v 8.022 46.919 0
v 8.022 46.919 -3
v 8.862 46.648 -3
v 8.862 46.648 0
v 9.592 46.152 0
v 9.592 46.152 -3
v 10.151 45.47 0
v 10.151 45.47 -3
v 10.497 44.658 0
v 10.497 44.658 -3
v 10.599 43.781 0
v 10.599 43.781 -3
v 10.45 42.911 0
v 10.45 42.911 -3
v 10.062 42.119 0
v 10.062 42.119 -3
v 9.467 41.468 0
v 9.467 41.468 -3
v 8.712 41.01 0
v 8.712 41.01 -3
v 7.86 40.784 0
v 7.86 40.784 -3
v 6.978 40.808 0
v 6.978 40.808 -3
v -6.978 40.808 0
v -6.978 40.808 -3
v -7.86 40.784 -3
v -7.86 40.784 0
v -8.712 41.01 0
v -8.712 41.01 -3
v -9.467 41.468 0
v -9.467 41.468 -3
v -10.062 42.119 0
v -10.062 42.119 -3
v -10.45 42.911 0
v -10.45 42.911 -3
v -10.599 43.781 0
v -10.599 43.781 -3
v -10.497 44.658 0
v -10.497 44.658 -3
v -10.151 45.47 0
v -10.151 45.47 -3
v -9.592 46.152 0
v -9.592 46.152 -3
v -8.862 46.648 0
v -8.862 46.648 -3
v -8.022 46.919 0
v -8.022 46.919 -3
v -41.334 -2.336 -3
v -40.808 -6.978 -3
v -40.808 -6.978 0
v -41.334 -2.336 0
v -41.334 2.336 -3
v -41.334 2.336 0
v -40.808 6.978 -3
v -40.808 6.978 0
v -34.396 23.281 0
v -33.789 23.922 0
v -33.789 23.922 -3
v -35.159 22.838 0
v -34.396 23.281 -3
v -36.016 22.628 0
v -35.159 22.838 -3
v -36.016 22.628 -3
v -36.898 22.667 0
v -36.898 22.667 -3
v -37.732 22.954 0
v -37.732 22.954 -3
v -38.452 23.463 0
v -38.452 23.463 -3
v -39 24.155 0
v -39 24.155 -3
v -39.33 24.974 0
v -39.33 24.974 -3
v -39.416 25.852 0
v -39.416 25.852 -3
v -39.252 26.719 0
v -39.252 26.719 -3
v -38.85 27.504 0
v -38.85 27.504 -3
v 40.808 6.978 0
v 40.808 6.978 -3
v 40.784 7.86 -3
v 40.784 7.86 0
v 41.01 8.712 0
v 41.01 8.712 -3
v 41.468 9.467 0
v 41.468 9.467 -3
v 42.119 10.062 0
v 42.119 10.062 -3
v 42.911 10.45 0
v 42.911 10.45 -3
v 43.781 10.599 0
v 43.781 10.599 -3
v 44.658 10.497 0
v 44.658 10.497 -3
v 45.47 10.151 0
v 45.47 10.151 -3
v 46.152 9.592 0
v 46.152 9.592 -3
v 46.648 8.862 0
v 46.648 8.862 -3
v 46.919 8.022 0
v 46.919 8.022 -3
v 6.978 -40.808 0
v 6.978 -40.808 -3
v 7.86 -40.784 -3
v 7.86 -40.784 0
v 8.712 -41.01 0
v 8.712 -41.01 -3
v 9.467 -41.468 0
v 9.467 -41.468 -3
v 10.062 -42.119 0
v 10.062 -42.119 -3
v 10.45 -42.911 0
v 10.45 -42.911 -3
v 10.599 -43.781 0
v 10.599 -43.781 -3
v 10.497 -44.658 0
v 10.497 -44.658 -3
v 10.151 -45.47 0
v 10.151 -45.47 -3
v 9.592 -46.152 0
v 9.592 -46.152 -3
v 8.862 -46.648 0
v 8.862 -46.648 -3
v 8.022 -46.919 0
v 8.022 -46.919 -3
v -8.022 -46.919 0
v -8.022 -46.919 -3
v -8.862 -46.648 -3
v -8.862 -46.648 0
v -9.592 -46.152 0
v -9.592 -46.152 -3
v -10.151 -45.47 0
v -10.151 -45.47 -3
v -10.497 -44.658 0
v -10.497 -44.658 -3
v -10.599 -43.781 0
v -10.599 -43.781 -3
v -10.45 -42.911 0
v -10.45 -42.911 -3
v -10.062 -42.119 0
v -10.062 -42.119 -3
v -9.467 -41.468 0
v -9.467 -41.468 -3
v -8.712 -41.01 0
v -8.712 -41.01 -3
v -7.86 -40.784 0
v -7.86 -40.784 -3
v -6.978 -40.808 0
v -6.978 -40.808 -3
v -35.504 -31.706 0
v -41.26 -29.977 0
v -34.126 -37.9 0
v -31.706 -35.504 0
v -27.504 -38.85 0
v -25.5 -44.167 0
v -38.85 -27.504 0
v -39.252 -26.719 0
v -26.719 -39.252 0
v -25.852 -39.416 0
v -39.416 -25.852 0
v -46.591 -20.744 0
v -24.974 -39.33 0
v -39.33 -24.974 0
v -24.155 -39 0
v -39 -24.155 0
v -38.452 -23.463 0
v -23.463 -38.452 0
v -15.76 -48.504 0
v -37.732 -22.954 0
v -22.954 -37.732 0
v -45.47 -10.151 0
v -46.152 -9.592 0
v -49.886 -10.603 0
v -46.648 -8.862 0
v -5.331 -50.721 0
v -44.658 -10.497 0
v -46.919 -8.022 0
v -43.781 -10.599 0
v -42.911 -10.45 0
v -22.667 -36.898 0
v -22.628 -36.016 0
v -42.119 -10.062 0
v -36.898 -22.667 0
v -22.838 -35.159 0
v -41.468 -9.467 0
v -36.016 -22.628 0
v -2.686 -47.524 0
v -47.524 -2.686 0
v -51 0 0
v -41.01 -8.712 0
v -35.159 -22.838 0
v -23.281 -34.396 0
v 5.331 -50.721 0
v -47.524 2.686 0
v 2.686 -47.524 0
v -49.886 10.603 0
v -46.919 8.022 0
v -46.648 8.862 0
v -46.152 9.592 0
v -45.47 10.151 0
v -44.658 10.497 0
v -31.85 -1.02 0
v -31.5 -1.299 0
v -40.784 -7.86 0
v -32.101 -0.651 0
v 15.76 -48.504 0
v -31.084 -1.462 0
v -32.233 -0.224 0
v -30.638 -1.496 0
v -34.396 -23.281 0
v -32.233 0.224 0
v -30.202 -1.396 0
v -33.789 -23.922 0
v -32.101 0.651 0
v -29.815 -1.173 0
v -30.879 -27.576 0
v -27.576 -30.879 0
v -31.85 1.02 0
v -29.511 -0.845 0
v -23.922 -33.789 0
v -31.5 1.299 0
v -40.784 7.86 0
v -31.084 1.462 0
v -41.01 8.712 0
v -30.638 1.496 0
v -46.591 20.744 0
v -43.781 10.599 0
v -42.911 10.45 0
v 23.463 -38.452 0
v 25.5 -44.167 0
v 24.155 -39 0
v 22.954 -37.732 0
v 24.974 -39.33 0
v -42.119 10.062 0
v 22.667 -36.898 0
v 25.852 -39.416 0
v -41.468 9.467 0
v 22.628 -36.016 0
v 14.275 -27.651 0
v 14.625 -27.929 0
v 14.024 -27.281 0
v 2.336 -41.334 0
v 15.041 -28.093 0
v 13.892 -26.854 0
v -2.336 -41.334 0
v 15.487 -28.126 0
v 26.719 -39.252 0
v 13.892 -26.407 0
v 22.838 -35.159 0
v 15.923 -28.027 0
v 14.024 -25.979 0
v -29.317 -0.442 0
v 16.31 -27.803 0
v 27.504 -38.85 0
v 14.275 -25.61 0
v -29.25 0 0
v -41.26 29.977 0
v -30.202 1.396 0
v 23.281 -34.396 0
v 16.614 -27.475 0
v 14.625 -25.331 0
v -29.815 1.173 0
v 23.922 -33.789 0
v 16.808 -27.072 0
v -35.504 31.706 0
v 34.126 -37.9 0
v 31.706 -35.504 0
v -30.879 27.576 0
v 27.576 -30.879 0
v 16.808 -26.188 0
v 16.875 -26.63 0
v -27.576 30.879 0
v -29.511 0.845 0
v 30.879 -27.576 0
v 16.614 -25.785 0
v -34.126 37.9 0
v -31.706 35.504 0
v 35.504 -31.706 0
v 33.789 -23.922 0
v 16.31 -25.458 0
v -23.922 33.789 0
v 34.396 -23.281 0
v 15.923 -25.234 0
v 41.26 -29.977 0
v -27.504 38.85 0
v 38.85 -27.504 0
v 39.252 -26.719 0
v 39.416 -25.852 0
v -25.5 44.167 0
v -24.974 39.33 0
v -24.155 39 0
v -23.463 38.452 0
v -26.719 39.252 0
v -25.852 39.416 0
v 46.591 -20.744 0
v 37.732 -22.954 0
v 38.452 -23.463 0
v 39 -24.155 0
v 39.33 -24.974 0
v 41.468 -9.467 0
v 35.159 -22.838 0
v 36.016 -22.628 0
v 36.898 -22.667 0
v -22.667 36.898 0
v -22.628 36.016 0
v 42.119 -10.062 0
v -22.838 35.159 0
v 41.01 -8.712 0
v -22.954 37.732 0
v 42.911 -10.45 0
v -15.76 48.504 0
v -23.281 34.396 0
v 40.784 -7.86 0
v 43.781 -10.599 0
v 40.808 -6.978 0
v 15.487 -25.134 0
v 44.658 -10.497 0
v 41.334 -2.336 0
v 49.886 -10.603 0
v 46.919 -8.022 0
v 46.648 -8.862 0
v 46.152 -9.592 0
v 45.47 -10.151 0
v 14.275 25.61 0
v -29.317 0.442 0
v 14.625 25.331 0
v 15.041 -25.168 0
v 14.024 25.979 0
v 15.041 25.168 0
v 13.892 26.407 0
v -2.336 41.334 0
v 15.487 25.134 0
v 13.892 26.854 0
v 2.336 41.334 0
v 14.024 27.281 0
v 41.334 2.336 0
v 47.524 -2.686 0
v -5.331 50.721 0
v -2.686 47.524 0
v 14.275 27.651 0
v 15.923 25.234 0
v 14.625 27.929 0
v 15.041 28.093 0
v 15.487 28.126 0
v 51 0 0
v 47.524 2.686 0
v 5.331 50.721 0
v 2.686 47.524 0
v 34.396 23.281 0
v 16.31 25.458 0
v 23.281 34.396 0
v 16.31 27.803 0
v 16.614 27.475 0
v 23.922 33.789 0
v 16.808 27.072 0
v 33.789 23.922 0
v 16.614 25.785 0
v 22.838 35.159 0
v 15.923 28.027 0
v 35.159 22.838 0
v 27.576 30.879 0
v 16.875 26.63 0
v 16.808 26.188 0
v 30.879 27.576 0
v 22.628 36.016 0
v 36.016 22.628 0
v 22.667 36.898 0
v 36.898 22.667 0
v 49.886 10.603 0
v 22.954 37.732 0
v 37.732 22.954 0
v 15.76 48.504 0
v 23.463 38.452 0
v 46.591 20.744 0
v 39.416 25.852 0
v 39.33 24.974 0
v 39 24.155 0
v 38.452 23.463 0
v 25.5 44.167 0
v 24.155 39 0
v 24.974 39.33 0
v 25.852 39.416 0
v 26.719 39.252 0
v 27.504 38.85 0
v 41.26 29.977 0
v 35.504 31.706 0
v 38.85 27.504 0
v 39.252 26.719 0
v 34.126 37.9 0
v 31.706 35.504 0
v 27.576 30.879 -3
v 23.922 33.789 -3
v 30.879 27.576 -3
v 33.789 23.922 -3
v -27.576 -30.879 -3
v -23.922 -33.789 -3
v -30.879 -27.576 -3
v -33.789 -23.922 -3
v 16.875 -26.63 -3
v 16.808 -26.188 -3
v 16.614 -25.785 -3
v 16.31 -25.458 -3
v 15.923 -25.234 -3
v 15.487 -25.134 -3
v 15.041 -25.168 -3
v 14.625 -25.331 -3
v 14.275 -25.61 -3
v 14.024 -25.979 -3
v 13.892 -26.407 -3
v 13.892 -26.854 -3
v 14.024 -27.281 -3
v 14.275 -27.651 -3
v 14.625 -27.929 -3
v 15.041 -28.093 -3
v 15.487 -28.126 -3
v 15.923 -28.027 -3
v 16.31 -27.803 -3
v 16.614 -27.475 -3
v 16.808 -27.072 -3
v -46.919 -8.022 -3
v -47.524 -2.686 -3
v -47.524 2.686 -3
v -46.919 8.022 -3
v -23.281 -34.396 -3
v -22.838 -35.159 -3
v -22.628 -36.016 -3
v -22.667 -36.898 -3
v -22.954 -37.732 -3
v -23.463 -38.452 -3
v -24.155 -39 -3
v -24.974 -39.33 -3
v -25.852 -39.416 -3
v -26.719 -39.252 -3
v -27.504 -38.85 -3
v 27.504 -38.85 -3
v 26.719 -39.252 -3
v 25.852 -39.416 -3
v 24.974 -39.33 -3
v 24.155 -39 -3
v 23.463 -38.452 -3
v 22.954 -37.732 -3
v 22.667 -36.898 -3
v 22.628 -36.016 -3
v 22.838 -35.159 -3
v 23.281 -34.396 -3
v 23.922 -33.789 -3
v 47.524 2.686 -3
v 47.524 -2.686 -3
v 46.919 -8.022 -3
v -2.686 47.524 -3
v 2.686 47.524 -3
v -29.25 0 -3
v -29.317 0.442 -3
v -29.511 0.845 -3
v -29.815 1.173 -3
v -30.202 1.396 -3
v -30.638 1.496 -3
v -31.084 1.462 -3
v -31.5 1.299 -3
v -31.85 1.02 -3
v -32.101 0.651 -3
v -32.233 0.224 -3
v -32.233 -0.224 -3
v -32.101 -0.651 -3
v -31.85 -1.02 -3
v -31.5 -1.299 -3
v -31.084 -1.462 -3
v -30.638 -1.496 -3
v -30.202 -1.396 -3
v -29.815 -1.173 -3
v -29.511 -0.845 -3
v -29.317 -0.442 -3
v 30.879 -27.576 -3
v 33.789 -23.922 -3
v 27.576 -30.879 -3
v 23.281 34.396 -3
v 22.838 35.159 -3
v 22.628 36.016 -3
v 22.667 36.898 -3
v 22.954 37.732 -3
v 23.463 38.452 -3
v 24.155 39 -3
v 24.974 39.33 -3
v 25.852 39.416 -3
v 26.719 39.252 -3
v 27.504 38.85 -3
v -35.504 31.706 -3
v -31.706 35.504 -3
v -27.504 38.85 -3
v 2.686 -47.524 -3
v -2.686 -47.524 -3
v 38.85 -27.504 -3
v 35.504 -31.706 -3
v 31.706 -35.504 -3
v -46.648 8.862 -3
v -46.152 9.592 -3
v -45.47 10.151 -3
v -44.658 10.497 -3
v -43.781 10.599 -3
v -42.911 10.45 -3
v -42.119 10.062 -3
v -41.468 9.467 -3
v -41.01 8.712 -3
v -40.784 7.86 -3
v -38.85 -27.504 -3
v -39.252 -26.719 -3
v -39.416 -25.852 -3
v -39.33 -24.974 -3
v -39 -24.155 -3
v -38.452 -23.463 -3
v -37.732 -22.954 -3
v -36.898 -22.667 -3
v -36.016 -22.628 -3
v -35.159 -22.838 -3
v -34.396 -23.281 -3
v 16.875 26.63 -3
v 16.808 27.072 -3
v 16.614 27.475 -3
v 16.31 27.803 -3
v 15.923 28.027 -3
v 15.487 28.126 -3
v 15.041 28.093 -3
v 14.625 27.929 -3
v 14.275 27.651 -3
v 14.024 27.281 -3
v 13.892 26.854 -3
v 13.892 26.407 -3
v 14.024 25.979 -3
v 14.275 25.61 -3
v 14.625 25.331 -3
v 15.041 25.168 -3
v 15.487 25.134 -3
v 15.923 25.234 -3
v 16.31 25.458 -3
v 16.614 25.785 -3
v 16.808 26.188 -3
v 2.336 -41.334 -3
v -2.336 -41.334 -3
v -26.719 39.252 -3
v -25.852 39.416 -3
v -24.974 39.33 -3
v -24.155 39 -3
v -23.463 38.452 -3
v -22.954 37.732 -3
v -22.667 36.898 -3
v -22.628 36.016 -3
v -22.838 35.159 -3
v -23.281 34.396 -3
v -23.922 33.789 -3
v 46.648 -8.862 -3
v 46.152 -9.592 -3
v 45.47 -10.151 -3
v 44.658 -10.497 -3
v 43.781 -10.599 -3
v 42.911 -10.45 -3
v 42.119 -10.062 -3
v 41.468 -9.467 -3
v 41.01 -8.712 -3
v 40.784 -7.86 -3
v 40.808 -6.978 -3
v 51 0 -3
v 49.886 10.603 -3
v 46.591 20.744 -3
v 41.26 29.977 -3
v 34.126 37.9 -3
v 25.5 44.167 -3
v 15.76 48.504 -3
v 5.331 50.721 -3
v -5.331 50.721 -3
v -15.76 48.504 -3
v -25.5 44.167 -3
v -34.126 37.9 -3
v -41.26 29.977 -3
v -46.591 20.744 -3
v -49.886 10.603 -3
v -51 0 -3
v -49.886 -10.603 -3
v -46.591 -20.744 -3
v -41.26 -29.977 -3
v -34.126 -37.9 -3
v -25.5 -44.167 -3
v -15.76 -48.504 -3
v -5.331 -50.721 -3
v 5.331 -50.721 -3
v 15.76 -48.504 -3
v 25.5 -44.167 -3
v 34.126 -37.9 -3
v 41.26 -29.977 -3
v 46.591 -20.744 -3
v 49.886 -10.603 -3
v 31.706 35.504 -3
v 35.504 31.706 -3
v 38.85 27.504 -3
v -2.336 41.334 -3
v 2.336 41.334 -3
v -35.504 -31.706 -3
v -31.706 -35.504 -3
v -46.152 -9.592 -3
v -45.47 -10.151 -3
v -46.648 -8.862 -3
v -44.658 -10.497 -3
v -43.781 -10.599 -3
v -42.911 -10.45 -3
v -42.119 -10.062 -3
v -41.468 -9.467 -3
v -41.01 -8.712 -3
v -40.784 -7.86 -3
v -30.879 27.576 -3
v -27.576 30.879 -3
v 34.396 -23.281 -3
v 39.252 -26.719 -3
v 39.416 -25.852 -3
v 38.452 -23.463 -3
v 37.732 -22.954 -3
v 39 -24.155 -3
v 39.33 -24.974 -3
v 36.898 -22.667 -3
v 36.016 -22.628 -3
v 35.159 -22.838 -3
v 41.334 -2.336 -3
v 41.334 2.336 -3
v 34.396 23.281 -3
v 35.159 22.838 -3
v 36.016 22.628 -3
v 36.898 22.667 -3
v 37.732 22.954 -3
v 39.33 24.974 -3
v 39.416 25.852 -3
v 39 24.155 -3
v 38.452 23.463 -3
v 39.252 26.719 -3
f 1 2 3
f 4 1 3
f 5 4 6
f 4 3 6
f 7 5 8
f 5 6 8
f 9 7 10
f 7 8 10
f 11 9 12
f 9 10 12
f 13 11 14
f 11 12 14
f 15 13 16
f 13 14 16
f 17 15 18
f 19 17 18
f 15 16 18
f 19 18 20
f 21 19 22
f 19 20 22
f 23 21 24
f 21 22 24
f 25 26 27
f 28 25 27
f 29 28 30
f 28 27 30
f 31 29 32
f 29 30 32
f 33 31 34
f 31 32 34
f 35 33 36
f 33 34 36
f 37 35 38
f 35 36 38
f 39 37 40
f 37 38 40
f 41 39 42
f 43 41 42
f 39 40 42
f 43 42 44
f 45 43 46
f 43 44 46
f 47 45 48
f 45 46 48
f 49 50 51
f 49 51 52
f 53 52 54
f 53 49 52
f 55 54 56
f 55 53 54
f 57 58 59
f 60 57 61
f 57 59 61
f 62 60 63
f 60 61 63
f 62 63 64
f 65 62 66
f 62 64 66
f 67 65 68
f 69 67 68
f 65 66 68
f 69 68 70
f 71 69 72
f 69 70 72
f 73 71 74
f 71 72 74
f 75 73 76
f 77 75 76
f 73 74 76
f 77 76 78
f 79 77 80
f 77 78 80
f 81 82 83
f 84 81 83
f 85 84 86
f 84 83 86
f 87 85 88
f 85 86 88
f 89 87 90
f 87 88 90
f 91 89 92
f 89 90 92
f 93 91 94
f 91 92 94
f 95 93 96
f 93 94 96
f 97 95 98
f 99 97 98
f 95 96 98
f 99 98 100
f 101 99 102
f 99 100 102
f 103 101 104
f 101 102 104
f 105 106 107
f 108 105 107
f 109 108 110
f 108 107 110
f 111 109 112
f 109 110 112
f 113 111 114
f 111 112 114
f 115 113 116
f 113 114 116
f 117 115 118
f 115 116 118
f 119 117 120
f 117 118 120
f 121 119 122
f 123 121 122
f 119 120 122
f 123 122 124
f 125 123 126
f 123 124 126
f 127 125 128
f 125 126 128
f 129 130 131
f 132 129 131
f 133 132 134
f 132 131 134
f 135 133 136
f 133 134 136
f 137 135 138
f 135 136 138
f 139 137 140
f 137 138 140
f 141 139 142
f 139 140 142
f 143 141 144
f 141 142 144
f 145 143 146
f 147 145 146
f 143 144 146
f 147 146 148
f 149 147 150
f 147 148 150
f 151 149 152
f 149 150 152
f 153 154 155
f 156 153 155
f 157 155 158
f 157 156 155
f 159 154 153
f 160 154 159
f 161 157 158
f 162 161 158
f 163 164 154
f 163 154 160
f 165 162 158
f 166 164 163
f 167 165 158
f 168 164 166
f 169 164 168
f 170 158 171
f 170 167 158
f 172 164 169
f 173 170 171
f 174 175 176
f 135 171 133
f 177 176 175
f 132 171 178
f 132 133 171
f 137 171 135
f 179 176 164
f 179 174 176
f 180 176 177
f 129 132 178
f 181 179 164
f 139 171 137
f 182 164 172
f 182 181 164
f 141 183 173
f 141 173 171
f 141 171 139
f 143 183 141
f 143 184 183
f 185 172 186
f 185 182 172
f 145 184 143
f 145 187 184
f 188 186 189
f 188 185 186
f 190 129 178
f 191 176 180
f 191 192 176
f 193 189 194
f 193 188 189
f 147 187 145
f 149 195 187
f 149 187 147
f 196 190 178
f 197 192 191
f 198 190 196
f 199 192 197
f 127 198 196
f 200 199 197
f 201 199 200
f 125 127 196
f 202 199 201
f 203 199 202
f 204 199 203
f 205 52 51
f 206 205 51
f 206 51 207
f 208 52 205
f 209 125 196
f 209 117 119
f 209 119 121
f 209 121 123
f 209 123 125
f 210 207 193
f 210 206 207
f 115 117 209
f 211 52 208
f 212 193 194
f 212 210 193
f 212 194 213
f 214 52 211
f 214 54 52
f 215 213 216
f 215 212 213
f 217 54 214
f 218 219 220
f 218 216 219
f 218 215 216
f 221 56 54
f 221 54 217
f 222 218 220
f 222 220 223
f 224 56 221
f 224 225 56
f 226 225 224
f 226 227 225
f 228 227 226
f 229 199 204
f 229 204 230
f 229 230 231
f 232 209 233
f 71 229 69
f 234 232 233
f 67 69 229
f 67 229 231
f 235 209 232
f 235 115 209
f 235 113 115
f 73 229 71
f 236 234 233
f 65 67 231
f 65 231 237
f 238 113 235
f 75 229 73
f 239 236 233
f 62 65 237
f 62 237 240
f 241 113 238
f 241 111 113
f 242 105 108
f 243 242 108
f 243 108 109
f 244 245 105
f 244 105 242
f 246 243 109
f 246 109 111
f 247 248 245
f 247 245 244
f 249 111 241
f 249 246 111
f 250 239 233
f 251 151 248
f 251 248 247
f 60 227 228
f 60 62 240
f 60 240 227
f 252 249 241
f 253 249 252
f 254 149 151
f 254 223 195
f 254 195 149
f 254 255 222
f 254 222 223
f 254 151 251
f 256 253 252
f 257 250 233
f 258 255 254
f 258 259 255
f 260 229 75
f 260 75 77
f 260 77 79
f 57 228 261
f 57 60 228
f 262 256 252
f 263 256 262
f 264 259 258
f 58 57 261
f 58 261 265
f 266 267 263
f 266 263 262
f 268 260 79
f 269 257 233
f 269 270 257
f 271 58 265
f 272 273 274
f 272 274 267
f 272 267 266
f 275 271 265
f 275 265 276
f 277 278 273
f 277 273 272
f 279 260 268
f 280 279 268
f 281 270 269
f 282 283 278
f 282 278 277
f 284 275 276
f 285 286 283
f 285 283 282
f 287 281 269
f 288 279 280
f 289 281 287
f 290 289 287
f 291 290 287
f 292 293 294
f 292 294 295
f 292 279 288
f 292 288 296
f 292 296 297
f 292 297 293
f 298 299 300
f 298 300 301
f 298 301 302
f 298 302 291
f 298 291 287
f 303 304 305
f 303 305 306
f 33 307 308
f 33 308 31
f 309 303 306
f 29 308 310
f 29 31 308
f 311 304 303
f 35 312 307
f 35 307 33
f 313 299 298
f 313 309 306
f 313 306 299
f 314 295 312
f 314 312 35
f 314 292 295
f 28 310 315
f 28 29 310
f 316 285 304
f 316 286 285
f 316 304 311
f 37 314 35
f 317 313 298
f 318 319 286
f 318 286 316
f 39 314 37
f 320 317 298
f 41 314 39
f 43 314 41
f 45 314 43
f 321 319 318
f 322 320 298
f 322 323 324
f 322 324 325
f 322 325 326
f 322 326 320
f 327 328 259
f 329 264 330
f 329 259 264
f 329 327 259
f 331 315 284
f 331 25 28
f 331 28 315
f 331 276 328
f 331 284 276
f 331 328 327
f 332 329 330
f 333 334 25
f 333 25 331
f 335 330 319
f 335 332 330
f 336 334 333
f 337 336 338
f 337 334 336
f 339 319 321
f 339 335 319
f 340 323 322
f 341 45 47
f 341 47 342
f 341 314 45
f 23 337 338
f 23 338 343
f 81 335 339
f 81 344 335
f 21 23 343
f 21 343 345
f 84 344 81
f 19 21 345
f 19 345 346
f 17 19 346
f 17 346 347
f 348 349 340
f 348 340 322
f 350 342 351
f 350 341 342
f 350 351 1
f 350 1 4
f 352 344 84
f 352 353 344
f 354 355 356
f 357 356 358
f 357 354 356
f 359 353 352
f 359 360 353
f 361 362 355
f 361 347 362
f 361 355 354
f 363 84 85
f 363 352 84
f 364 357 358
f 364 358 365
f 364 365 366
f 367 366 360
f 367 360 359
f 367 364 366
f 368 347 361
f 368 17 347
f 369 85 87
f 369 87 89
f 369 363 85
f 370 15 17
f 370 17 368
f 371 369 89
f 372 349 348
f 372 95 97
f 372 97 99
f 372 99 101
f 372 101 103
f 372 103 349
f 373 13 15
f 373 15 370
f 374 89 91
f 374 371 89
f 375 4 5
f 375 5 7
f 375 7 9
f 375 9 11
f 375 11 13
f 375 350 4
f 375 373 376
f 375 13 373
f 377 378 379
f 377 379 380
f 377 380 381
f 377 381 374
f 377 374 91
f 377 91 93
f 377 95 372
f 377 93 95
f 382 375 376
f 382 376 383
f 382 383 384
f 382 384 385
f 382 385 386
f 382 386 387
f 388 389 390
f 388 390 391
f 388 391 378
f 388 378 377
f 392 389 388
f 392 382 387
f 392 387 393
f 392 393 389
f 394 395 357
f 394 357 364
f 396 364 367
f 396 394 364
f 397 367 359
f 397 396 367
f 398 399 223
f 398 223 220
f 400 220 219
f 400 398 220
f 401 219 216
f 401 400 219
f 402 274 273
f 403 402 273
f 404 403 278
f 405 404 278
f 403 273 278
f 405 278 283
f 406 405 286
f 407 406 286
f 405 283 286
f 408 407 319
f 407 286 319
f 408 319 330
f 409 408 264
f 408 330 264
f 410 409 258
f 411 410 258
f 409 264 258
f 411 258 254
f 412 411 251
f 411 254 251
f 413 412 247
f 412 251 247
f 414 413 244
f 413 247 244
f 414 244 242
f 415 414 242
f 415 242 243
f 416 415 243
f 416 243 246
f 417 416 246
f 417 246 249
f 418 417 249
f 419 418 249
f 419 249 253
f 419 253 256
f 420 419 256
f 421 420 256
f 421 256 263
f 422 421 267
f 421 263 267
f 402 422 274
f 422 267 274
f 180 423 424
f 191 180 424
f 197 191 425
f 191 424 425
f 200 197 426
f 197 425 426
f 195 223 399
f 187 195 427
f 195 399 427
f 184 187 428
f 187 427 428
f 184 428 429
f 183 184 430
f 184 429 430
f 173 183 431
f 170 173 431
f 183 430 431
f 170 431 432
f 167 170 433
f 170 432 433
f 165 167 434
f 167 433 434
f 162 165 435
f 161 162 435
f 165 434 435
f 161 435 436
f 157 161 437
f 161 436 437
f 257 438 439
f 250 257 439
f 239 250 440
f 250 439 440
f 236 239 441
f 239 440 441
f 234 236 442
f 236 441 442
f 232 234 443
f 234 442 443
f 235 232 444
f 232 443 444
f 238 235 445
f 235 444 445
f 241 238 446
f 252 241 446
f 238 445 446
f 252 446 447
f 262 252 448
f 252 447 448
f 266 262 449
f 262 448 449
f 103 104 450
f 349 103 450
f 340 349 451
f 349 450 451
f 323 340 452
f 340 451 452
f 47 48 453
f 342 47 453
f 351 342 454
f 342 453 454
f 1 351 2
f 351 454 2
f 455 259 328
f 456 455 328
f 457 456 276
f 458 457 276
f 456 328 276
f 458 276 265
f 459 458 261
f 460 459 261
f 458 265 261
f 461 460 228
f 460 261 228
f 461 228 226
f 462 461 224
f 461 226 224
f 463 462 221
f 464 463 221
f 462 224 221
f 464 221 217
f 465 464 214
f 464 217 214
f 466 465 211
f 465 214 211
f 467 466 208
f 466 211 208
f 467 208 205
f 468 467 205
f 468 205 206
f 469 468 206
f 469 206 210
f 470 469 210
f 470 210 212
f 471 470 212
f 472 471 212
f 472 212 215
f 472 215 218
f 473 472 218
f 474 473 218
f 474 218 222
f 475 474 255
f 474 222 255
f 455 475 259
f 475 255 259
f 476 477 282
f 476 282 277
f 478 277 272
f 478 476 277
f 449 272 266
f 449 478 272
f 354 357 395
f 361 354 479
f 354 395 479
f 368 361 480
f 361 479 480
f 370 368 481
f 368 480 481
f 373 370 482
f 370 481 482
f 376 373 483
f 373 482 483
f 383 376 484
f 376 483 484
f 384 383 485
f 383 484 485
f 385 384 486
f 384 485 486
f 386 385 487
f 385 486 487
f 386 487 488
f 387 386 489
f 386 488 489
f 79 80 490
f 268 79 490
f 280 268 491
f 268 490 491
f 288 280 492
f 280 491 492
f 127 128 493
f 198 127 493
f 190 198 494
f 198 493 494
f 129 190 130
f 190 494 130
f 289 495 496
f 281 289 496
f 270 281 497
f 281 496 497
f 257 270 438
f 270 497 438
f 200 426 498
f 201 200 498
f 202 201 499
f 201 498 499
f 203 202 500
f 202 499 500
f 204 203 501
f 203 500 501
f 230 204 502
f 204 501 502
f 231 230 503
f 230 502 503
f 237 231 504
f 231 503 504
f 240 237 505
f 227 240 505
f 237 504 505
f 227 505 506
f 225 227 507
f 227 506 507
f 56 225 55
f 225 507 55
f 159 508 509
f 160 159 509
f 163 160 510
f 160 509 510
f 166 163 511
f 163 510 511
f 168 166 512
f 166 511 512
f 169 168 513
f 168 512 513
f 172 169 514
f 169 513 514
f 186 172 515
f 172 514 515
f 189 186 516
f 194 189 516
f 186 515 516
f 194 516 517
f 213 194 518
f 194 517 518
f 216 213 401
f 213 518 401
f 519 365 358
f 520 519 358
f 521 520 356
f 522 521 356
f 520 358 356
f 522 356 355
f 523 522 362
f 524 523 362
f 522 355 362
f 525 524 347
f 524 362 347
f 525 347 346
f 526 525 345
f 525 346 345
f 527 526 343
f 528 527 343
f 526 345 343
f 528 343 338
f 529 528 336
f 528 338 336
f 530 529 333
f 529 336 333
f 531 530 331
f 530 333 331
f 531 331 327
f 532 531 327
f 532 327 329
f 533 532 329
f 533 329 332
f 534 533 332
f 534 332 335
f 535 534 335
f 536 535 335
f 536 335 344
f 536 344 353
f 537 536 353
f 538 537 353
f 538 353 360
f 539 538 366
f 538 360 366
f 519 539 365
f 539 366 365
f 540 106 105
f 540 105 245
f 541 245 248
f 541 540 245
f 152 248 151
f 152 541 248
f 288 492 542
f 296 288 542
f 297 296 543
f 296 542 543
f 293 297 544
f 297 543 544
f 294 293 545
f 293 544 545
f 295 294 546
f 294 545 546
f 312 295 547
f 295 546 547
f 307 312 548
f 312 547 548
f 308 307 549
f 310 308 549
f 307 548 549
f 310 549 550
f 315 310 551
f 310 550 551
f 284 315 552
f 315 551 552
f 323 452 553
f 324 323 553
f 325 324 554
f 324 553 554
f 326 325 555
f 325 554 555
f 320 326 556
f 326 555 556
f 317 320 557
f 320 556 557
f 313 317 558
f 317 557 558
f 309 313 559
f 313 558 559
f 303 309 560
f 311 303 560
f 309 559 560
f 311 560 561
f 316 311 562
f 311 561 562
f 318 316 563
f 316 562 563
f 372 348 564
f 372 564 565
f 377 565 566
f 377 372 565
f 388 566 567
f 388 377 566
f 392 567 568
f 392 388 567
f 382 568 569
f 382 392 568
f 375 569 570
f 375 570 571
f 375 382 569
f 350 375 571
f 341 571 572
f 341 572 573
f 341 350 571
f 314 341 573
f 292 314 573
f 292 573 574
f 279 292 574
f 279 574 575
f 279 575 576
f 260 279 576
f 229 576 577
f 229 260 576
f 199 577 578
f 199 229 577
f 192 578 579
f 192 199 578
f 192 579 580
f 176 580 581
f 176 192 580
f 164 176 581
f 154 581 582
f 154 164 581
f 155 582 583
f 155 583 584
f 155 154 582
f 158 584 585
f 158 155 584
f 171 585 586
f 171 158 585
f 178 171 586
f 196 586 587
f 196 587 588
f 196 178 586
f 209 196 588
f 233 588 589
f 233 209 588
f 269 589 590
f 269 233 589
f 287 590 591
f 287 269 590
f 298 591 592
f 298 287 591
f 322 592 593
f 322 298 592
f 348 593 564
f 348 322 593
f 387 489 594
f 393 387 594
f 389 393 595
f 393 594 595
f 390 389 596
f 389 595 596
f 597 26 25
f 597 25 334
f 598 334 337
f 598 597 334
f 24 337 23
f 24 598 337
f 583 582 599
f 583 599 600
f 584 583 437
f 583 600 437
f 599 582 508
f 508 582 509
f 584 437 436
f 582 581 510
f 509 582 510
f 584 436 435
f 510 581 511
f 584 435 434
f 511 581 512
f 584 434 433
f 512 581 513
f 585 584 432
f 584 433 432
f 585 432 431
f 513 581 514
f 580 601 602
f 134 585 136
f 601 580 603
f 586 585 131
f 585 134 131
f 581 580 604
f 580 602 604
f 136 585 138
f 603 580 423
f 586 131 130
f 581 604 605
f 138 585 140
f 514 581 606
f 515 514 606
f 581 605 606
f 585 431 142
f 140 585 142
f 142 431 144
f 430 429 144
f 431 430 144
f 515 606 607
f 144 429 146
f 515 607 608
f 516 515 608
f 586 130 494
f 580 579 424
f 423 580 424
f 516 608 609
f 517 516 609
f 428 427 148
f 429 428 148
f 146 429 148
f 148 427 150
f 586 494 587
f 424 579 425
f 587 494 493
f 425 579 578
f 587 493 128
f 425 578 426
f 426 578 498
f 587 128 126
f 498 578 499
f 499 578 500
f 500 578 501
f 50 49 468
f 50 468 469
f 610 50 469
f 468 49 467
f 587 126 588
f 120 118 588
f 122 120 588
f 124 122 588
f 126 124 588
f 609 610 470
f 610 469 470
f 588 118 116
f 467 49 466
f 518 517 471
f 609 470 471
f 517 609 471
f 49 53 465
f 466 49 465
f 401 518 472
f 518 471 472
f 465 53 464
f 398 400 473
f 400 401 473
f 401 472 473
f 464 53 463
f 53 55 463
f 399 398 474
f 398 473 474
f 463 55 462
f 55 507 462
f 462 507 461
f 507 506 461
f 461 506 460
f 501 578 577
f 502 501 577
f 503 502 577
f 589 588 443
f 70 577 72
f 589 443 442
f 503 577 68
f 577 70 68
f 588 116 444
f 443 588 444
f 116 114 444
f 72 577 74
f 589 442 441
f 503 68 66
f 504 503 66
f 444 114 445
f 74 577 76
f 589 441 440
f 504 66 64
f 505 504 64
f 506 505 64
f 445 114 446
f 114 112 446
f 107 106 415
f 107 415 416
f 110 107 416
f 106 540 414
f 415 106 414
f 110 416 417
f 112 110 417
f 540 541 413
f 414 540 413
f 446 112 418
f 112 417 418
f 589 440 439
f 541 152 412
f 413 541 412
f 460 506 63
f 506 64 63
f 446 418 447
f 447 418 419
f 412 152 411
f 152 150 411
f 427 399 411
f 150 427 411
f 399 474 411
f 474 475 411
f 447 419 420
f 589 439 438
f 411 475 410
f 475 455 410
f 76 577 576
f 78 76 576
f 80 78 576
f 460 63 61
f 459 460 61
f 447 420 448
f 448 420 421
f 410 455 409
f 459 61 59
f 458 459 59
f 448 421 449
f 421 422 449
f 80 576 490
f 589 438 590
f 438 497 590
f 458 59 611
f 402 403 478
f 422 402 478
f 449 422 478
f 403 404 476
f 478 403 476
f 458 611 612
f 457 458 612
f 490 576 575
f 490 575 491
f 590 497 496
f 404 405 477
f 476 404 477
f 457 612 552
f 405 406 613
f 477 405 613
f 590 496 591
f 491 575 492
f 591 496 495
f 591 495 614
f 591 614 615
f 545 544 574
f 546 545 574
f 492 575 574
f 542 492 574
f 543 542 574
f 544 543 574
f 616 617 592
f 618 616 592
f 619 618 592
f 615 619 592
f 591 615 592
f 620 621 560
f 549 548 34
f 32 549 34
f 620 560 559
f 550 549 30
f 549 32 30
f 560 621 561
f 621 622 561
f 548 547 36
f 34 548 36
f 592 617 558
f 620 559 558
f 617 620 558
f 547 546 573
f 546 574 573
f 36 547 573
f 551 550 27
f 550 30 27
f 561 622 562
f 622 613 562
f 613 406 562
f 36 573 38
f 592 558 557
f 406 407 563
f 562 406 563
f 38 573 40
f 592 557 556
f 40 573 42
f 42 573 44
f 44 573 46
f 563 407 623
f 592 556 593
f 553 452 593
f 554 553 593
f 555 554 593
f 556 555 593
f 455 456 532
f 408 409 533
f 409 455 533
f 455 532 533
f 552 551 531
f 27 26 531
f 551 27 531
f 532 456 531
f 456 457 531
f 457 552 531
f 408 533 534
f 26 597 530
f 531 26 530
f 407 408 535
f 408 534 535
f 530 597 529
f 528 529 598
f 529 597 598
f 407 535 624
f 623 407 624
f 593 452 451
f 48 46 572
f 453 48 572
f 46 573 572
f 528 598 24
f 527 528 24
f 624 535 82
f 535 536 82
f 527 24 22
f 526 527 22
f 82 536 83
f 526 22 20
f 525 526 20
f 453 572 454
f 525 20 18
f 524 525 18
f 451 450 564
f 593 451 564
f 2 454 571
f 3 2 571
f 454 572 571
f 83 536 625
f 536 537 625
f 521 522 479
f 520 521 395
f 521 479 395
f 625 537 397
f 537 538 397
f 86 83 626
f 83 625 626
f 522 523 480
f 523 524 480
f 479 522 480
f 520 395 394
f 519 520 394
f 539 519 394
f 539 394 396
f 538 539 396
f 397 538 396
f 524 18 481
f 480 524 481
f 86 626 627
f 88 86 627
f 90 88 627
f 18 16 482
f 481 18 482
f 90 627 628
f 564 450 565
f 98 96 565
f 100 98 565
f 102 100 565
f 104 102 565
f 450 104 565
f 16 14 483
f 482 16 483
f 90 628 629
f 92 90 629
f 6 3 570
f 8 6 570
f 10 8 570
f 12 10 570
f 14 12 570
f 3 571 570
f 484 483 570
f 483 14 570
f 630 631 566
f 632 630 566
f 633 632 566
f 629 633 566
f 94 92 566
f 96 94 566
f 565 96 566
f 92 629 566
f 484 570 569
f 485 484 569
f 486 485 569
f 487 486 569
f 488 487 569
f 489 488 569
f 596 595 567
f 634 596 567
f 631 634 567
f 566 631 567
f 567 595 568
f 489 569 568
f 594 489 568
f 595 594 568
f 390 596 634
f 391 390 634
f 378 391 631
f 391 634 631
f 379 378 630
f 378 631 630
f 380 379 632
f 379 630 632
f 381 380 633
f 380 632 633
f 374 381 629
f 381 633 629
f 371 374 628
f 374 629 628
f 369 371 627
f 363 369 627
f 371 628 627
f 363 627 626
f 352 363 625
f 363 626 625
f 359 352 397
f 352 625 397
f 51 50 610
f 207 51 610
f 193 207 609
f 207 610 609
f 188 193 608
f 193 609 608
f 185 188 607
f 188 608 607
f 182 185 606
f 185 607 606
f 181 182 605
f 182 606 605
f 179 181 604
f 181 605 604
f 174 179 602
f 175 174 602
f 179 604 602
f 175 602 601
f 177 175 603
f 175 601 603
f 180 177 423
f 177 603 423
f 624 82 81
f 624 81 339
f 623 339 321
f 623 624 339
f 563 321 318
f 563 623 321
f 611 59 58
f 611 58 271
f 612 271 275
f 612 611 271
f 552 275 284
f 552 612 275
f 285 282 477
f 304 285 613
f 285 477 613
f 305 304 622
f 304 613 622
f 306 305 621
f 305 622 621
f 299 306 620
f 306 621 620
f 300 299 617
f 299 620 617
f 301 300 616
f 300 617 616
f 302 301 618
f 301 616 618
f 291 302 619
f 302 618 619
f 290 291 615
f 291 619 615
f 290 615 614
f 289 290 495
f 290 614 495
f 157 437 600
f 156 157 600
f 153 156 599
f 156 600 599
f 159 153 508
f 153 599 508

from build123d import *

# Parameters (mm, degrees)
SKETCH015_R        = 51
SKETCH015_R_2      = 1.5
PAD013_DEPTH       = 3
POCKET_DEPTH       = 291.562952
POLARPATTERN_COUNT = 8


with BuildPart() as part:
    # Sketch015 → Pad013 (new body)
    with BuildSketch(Plane.XY):
        Circle(SKETCH015_R)
        with Locations((15.375, 26.630281)):
            Circle(SKETCH015_R_2, mode=Mode.SUBTRACT)
        with Locations((-30.75, 0)):
            Circle(SKETCH015_R_2, mode=Mode.SUBTRACT)
        with Locations((15.375, -26.630281)):
            Circle(SKETCH015_R_2, mode=Mode.SUBTRACT)
    extrude(amount=-PAD013_DEPTH)

    # Sketch017 (on Face6 of Pad013) → Pocket (cut, through all)
    with BuildSketch(Plane(origin=(0, 0, -3), x_dir=(1, 0, 0), z_dir=(0, 0, -1))):
        with BuildLine():
            ThreePointArc((8.022472, 46.919079), (0, 47.6), (-8.022472, 46.919079))
            ThreePointArc((-8.022472, 46.919079), (-10.555654, 43.340952), (-6.977528, 40.80777))
            ThreePointArc((6.977528, 40.80777), (0, 41.4), (-6.977528, 40.80777))
            ThreePointArc((6.977528, 40.80777), (10.555654, 43.340952), (8.022472, 46.919079))
        make_face()
    pocket = extrude(amount=-POCKET_DEPTH, mode=Mode.SUBTRACT)

    # PolarPattern: Pocket ×8 about axis
    polarpattern_axis = Axis((0, 0, -3), (0, 0, -1))
    for i in range(1, POLARPATTERN_COUNT):
        add(pocket.rotate(polarpattern_axis, i * 360 / POLARPATTERN_COUNT), mode=Mode.SUBTRACT)


solid = part.part
